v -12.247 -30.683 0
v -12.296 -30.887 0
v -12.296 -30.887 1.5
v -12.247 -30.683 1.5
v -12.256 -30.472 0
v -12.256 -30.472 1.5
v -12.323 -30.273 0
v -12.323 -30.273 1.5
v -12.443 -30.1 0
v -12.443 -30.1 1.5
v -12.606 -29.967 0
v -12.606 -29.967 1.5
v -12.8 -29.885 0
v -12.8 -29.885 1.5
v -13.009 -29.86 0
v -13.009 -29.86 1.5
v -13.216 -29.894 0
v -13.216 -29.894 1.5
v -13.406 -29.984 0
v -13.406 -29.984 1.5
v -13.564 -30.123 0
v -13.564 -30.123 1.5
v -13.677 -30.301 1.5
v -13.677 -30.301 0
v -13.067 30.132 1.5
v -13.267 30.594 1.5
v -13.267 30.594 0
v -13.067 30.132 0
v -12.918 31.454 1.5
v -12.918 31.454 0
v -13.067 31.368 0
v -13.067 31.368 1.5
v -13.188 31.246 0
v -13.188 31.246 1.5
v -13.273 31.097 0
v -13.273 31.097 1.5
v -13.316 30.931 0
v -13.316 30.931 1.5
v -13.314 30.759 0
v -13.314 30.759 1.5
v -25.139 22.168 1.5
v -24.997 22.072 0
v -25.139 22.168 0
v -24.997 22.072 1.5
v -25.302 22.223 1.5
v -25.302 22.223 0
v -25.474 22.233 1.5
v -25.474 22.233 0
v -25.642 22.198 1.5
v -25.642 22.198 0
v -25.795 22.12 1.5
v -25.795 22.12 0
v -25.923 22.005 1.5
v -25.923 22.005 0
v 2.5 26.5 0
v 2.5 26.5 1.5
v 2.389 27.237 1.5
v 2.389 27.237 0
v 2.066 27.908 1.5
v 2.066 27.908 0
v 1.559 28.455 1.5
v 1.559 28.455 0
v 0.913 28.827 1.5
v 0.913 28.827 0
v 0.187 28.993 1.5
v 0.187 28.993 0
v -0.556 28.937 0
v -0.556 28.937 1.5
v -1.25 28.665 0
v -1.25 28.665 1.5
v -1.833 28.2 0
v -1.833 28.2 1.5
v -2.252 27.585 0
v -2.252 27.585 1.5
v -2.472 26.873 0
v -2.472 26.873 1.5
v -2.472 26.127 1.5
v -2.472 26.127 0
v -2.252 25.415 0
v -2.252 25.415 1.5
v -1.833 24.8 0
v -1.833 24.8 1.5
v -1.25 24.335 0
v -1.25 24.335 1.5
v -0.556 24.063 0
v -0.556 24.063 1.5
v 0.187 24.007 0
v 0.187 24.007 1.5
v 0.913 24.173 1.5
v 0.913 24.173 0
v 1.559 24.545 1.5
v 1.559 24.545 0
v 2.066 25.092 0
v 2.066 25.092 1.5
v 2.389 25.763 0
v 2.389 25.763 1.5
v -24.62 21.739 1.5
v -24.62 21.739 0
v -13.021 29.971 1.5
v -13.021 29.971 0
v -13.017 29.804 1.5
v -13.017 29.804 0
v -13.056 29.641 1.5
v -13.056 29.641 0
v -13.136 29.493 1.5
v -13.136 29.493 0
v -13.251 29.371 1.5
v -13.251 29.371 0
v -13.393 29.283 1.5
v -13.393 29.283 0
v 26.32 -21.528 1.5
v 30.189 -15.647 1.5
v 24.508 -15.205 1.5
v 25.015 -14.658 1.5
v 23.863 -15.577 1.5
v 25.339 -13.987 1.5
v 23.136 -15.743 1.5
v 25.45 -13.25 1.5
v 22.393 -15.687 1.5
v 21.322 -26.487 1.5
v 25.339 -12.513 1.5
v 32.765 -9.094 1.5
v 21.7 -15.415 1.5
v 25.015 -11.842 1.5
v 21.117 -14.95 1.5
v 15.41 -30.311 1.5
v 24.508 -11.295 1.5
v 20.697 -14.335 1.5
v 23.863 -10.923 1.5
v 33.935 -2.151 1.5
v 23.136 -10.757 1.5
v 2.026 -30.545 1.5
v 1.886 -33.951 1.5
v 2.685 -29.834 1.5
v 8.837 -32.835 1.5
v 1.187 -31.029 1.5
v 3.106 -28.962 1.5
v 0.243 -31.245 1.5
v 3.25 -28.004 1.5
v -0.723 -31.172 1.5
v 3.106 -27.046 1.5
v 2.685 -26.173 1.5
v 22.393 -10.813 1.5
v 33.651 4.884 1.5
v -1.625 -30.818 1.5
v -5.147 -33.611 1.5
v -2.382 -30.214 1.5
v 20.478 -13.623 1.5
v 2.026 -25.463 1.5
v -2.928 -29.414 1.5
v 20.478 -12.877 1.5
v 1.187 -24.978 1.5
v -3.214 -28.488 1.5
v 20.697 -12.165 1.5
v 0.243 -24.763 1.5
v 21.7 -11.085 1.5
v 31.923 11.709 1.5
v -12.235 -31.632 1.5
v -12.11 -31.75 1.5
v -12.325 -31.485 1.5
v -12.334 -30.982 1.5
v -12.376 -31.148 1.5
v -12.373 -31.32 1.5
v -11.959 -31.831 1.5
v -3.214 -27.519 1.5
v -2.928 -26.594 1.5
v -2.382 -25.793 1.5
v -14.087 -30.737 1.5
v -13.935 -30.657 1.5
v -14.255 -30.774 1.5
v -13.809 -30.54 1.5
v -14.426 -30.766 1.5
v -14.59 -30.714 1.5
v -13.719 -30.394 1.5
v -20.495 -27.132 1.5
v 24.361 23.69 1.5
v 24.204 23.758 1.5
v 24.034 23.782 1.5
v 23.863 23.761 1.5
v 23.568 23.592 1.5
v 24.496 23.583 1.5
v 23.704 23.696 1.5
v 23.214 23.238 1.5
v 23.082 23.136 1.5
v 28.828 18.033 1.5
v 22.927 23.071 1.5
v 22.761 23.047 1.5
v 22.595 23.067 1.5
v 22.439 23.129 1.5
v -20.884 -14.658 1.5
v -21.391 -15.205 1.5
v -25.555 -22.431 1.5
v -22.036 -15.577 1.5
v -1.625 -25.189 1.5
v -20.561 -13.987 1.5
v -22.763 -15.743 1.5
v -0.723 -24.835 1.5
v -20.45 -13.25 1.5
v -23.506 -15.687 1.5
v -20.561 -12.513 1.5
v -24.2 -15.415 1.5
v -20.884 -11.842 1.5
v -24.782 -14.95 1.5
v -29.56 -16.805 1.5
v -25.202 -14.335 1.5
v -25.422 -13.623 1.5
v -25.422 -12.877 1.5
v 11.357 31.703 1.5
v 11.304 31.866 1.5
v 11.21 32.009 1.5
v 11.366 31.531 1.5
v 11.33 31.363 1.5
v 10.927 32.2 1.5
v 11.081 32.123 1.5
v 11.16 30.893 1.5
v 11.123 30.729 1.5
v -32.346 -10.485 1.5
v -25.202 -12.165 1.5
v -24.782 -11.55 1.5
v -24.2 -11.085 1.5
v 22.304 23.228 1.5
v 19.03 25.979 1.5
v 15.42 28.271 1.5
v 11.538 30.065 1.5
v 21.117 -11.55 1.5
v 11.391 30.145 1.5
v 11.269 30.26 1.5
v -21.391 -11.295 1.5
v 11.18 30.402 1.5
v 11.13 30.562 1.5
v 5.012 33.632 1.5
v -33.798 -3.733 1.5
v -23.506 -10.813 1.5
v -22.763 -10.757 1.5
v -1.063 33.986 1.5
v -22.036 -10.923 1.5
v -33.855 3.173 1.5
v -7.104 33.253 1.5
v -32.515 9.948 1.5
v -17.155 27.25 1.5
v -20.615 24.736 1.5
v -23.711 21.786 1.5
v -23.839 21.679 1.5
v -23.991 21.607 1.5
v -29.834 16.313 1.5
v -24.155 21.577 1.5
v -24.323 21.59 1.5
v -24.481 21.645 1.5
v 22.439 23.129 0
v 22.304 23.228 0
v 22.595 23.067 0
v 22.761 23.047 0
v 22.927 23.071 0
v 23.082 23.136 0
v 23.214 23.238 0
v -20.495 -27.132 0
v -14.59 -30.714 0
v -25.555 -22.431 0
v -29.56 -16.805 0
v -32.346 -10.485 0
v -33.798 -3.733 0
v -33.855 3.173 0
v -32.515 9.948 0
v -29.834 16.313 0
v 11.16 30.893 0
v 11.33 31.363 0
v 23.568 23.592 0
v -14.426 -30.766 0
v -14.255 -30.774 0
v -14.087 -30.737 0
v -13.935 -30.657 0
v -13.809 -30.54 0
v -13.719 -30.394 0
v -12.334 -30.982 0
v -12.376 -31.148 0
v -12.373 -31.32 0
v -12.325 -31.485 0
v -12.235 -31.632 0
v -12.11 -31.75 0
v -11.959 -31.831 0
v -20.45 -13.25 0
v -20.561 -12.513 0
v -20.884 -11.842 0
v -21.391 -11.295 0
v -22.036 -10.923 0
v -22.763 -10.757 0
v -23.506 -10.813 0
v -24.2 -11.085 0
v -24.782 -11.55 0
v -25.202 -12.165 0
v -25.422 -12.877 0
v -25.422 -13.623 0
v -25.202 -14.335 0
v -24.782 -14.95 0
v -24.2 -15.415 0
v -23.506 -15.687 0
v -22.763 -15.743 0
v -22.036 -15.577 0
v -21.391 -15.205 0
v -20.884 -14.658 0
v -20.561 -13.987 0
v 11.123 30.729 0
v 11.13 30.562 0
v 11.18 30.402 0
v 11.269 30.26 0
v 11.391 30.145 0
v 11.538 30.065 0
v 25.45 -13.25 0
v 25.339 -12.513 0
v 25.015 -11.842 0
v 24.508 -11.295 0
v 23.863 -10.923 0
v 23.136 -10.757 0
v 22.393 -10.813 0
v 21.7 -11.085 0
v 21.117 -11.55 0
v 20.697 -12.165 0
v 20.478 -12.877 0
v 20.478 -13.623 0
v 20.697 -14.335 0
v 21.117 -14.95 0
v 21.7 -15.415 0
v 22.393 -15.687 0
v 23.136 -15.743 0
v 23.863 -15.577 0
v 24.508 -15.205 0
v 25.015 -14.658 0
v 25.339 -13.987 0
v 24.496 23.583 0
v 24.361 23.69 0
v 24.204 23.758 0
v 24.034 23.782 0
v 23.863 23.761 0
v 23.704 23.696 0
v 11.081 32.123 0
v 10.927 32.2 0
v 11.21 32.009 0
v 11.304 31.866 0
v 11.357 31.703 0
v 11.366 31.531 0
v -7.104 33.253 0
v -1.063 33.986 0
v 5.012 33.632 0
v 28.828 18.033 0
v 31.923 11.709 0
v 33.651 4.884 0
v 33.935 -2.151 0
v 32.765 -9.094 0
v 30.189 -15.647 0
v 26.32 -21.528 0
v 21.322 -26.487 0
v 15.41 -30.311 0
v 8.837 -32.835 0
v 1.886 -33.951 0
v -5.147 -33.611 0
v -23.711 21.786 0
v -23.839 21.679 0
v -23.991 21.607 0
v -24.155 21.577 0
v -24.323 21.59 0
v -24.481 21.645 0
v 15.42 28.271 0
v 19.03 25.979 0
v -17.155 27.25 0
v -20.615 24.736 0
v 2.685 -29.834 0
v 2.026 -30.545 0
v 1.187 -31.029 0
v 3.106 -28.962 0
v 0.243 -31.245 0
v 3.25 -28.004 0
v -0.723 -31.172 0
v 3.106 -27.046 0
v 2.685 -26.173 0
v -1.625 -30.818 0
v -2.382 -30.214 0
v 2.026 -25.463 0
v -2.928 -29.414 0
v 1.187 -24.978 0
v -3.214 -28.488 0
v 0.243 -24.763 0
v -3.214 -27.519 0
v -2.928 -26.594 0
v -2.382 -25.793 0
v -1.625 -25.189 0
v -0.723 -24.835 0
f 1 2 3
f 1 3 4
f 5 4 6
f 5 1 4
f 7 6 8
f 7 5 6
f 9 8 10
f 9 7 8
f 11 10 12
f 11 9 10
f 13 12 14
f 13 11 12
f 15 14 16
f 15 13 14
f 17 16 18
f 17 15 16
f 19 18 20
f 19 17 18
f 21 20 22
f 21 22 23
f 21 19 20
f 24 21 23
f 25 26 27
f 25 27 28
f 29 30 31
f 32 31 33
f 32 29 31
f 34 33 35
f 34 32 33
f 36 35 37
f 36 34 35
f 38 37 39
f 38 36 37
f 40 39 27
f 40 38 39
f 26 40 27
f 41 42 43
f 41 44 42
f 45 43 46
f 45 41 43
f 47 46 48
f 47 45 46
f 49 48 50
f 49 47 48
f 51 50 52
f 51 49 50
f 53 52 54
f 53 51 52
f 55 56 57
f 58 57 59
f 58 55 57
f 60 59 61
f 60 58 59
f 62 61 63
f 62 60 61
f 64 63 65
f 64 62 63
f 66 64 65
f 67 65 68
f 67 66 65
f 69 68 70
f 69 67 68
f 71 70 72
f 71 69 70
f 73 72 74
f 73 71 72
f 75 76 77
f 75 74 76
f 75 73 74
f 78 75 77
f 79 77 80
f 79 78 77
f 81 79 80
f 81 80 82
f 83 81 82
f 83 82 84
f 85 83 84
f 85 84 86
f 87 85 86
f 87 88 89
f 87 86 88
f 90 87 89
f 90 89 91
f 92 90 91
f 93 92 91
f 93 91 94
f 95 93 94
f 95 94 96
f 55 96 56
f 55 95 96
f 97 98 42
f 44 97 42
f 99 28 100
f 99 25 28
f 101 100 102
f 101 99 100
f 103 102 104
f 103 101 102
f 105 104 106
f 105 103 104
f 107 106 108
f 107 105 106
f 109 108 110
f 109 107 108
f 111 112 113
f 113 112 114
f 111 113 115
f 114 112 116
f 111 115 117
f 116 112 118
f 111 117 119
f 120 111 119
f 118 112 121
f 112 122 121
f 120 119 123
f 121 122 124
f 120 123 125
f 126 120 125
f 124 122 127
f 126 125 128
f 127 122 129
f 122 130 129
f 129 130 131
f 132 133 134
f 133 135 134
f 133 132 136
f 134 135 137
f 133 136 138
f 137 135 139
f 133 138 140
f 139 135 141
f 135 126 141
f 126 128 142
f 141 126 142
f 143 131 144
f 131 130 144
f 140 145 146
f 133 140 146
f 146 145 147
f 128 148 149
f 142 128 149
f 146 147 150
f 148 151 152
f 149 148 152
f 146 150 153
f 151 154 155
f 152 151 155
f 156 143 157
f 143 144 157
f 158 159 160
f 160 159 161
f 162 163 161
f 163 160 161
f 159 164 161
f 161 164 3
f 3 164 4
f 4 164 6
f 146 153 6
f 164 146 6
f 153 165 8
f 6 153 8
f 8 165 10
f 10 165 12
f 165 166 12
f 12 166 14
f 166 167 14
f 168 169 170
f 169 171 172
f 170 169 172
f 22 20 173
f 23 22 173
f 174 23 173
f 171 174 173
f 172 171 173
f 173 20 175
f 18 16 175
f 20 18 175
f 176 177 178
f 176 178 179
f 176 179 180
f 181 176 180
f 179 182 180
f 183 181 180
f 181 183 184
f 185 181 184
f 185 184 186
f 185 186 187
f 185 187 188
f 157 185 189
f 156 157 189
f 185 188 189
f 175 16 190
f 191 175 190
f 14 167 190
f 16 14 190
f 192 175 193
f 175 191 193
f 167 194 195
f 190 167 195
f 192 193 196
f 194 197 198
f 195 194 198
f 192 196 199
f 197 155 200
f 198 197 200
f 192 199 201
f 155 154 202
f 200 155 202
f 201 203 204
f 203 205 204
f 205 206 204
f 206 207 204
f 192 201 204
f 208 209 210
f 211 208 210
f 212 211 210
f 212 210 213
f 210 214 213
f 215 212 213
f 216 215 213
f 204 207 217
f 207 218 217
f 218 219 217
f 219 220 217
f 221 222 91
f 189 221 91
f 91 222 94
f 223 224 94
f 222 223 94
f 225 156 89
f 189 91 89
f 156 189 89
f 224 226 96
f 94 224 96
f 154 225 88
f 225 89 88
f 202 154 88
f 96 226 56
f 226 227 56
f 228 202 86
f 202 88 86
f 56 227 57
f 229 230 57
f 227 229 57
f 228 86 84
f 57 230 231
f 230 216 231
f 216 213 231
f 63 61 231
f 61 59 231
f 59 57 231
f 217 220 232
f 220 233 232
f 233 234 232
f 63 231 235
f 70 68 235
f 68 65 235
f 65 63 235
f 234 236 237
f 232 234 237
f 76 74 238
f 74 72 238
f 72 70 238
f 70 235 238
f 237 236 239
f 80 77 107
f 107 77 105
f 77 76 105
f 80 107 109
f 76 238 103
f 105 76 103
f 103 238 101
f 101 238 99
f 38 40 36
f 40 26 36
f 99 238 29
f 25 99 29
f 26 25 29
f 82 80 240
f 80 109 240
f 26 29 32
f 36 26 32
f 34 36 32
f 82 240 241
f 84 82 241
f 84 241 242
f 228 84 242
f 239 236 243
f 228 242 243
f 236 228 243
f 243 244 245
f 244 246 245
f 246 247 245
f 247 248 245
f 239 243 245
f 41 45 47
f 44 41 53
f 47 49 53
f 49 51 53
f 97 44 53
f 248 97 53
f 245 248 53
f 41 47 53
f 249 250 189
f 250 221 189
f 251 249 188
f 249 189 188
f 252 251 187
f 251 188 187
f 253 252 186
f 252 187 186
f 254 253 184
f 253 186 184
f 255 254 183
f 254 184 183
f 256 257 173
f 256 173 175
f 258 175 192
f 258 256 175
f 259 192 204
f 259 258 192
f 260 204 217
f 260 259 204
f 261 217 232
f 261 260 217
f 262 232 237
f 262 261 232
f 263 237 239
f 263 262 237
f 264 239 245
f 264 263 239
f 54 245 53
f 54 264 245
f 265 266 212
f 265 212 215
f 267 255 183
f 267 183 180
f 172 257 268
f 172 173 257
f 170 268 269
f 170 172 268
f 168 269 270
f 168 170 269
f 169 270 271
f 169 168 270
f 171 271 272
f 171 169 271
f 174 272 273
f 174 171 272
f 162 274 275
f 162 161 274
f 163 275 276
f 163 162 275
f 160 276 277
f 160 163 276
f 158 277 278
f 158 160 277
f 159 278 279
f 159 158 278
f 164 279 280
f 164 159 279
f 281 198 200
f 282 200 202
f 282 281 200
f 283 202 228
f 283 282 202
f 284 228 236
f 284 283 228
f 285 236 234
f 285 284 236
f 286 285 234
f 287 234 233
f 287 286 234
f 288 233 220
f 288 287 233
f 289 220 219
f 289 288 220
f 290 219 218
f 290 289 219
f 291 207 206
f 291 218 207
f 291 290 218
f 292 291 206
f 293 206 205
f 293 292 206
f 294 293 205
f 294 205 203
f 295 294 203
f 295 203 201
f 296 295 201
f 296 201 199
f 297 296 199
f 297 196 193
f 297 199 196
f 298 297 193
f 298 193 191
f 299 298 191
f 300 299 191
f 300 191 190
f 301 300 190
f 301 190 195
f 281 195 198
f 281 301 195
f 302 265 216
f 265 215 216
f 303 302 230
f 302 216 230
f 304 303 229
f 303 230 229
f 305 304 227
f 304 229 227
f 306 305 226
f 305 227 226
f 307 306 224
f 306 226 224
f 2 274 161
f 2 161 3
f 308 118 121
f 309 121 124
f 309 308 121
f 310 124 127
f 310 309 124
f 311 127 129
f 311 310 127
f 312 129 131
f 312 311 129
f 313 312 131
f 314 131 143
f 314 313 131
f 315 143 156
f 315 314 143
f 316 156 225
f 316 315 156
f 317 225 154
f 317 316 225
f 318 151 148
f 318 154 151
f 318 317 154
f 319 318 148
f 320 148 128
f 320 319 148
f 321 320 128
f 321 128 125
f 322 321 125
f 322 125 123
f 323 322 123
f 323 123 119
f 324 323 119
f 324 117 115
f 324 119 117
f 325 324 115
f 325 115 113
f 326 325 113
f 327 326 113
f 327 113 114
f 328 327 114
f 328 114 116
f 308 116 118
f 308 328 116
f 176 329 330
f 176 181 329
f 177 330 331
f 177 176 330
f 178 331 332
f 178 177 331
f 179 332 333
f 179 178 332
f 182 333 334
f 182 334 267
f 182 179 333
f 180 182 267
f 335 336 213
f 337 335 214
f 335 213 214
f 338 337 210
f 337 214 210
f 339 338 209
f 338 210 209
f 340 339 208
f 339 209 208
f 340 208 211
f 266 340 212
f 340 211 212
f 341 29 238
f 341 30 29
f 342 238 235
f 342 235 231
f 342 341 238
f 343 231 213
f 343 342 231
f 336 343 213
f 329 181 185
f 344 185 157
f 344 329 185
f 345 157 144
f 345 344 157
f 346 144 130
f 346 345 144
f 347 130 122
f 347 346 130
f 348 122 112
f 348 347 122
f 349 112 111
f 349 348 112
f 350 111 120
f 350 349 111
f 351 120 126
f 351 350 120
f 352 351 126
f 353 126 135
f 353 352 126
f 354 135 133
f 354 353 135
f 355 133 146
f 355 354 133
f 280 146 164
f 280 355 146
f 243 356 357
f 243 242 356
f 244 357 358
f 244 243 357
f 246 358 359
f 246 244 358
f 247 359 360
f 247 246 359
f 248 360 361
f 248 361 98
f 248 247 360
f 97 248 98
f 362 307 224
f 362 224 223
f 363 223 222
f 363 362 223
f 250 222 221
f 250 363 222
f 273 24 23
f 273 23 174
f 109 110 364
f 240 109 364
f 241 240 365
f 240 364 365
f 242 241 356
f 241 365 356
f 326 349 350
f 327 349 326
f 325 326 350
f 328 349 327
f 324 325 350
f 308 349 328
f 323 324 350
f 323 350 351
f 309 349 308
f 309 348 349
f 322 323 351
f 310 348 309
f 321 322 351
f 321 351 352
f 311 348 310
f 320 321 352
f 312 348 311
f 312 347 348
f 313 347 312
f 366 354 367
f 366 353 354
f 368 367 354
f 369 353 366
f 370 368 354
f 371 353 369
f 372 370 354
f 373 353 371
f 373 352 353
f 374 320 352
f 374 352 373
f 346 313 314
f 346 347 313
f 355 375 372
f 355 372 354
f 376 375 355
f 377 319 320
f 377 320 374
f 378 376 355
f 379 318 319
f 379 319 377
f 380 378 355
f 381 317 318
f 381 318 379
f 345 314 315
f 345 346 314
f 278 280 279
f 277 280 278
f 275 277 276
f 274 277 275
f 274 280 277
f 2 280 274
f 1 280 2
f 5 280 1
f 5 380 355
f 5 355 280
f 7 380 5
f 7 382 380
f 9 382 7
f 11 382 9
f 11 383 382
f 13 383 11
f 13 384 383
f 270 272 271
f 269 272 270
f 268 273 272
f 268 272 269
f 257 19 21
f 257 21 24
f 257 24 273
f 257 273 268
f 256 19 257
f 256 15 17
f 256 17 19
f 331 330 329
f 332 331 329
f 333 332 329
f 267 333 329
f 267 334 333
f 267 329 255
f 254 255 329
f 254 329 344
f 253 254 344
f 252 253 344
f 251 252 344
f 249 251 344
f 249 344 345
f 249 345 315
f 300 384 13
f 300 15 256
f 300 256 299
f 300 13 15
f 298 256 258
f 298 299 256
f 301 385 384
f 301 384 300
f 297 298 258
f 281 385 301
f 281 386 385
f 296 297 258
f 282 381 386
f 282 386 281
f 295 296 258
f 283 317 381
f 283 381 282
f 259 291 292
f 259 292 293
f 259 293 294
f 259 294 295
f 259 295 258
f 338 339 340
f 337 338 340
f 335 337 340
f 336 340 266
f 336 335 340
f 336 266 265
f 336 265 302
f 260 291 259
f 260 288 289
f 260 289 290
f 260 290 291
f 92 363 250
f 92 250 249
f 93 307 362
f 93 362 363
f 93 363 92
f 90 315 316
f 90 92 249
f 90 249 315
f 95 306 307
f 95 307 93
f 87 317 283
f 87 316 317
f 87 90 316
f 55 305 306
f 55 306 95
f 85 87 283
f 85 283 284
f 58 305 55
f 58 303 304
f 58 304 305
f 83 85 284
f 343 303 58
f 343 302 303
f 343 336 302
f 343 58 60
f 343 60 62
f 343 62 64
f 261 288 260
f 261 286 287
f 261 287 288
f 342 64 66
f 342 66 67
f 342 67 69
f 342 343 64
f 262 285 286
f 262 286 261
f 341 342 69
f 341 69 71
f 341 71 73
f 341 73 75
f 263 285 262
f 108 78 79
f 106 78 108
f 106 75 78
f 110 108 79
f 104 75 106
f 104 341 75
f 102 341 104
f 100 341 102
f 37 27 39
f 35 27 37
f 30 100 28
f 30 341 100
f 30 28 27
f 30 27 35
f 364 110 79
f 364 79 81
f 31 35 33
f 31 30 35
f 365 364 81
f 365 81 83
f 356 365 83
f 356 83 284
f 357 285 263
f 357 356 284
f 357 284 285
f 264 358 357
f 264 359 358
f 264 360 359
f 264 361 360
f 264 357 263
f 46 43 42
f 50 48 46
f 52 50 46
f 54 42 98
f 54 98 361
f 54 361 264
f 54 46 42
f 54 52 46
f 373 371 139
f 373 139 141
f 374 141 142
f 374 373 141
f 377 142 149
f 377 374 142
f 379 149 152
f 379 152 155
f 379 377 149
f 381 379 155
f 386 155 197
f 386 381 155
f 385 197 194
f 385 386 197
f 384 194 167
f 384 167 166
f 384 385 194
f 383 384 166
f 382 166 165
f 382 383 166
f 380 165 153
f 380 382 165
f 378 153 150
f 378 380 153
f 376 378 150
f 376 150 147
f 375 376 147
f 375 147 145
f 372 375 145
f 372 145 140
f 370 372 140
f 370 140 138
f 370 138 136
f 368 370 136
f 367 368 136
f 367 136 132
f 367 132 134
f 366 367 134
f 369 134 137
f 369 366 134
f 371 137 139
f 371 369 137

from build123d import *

# Parameters (mm, degrees)
SALIENTE_EXTRUIR2_DEPTH = 1.5
CROQUIS5_R              = 34.003076767
CROQUIS5_R_2            = 3.25
SALIENTE_EXTRUIR3_DEPTH = 1.5
CORTAR_EXTRUIR6_DEPTH   = 1.5
REDONDEO2_R             = 0.65
CORTAR_EXTRUIR7_START   = -1.5
CORTAR_EXTRUIR7_DEPTH   = 1.5
REDONDEO3_R             = 0.65
CORTAR_EXTRUIR8_START   = -1.5
CORTAR_EXTRUIR8_DEPTH   = 1.5
REDONDEO4_R             = 0.65
CROQUIS9_R              = 2.5
CORTAR_EXTRUIR10_DEPTH  = 49.111001436


with BuildPart() as part:
    # Croquis3 → Saliente-Extruir2 (new body)
    with BuildSketch(Plane.XY):
        with BuildLine():
            Line((-5.157307796, -27.019308404), (-6.280793024, -32.905285166))
            ThreePointArc((-6.280793024, -32.905285166), (-6.494024336, -33.227196877), (-6.872990522, -33.301219661))
            ThreePointArc((-6.872990522, -33.301219661), (0, 34.003076767), (6.872990522, -33.301219661))
            ThreePointArc((6.872990522, -33.301219661), (6.494024336, -33.227196877), (6.280793024, -32.905285166))
            Line((6.280793024, -32.905285166), (5.157307796, -27.019308404))
            ThreePointArc((5.157307796, -27.019308404), (0, -22.753293006), (-5.157307796, -27.019308404))
        make_face()
    extrude(amount=SALIENTE_EXTRUIR2_DEPTH)

    # Croquis5 → Saliente-Extruir3 (add)
    with BuildSketch(Plane.XY):
        with Locations(Location((0, 0, 0), (0, 0, 180))):
            Circle(CROQUIS5_R)
        with Locations((0, -28.003709015)):
            Circle(CROQUIS5_R_2, mode=Mode.SUBTRACT)
    extrude(amount=SALIENTE_EXTRUIR3_DEPTH)

    # Croquis4 → Cortar-Extruir6 (cut)
    with BuildSketch(Plane.XY):
        with BuildLine():
            ThreePointArc((10.940986169, 30.28750526), (17.262989212, 27.1850576), (22.759447155, 22.782574886))
            Line((22.759447155, 22.782574886), (24.031592832, 24.056013293))
            ThreePointArc((24.031592832, 24.056013293), (18.227908832, 28.704574012), (11.552535657, 31.980433854))
            Line((11.552535657, 31.980433854), (10.940986169, 30.28750526))
        make_face()
    extrude(amount=CORTAR_EXTRUIR6_DEPTH, mode=Mode.SUBTRACT)

    # Redondeo2
    redondeo2_edges = [part.edges().sort_by_distance(p)[0] for p in [
        (11.552535657, 31.980433854, 0.75),
        (10.940986169, 30.28750526, 0.75),
        (22.759447155, 22.782574886, 0.75),
        (24.031592832, 24.056013293, 0.75),
    ]]
    fillet(redondeo2_edges, radius=REDONDEO2_R)

    # Croquis6 → Cortar-Extruir7 (cut)
    with BuildSketch(Plane.XY.offset(1.5).offset(CORTAR_EXTRUIR7_START)):
        with BuildLine():
            Line((-24.137163622, 21.312844303), (-25.488752409, 22.506282018))
            ThreePointArc((-25.488752409, 22.506282018), (-19.986507056, 27.509066965), (-13.528288511, 31.196067694))
            Line((-13.528288511, 31.196067694), (-12.8109257, 29.541837835))
            ThreePointArc((-12.8109257, 29.541837835), (-18.926685124, 26.050347219), (-24.137163622, 21.312844303))
        make_face()
    extrude(amount=CORTAR_EXTRUIR7_DEPTH, mode=Mode.SUBTRACT)

    # Redondeo3
    redondeo3_edges = [part.edges().sort_by_distance(p)[0] for p in [
        (-12.8109257, 29.541837835, 0.75),
        (-24.137163622, 21.312844303, 0.75),
        (-25.488752409, 22.506282018, 0.75),
        (-13.528288511, 31.196067694, 0.75),
    ]]
    fillet(redondeo3_edges, radius=REDONDEO3_R)

    # Croquis7 → Cortar-Extruir8 (cut)
    with BuildSketch(Plane.XY.offset(1.5).offset(CORTAR_EXTRUIR8_START)):
        with BuildLine():
            Line((-13.67660573, -30.301073746), (-13.98863049, -30.992377234))
            ThreePointArc((-13.98863049, -30.992377234), (-13.286060557, -31.299997196), (-12.57673119, -31.59169293))
            Line((-12.57673119, -31.59169293), (-12.296199688, -30.887021347))
            ThreePointArc((-12.296199688, -30.887021347), (-12.699963864, -29.919239916), (-13.67660573, -30.301073746))
        make_face()
    extrude(amount=CORTAR_EXTRUIR8_DEPTH, mode=Mode.SUBTRACT)

    # Redondeo4
    redondeo4_edges = [part.edges().sort_by_distance(p)[0] for p in [
        (-12.57673119, -31.59169293, 0.75),
        (-13.98863049, -30.992377234, 0.75),
    ]]
    fillet(redondeo4_edges, radius=REDONDEO4_R)

    # Croquis9 → Cortar-Extruir10 (cut, through all)
    with BuildSketch(Plane.XY):
        with Locations((-22.9496732, -13.25)):
            Circle(CROQUIS9_R)
        with Locations((22.9496732, -13.25)):
            Circle(CROQUIS9_R)
        with Locations((0, 26.5)):
            Circle(CROQUIS9_R)
    extrude(amount=CORTAR_EXTRUIR10_DEPTH, mode=Mode.SUBTRACT)


solid = part.part
